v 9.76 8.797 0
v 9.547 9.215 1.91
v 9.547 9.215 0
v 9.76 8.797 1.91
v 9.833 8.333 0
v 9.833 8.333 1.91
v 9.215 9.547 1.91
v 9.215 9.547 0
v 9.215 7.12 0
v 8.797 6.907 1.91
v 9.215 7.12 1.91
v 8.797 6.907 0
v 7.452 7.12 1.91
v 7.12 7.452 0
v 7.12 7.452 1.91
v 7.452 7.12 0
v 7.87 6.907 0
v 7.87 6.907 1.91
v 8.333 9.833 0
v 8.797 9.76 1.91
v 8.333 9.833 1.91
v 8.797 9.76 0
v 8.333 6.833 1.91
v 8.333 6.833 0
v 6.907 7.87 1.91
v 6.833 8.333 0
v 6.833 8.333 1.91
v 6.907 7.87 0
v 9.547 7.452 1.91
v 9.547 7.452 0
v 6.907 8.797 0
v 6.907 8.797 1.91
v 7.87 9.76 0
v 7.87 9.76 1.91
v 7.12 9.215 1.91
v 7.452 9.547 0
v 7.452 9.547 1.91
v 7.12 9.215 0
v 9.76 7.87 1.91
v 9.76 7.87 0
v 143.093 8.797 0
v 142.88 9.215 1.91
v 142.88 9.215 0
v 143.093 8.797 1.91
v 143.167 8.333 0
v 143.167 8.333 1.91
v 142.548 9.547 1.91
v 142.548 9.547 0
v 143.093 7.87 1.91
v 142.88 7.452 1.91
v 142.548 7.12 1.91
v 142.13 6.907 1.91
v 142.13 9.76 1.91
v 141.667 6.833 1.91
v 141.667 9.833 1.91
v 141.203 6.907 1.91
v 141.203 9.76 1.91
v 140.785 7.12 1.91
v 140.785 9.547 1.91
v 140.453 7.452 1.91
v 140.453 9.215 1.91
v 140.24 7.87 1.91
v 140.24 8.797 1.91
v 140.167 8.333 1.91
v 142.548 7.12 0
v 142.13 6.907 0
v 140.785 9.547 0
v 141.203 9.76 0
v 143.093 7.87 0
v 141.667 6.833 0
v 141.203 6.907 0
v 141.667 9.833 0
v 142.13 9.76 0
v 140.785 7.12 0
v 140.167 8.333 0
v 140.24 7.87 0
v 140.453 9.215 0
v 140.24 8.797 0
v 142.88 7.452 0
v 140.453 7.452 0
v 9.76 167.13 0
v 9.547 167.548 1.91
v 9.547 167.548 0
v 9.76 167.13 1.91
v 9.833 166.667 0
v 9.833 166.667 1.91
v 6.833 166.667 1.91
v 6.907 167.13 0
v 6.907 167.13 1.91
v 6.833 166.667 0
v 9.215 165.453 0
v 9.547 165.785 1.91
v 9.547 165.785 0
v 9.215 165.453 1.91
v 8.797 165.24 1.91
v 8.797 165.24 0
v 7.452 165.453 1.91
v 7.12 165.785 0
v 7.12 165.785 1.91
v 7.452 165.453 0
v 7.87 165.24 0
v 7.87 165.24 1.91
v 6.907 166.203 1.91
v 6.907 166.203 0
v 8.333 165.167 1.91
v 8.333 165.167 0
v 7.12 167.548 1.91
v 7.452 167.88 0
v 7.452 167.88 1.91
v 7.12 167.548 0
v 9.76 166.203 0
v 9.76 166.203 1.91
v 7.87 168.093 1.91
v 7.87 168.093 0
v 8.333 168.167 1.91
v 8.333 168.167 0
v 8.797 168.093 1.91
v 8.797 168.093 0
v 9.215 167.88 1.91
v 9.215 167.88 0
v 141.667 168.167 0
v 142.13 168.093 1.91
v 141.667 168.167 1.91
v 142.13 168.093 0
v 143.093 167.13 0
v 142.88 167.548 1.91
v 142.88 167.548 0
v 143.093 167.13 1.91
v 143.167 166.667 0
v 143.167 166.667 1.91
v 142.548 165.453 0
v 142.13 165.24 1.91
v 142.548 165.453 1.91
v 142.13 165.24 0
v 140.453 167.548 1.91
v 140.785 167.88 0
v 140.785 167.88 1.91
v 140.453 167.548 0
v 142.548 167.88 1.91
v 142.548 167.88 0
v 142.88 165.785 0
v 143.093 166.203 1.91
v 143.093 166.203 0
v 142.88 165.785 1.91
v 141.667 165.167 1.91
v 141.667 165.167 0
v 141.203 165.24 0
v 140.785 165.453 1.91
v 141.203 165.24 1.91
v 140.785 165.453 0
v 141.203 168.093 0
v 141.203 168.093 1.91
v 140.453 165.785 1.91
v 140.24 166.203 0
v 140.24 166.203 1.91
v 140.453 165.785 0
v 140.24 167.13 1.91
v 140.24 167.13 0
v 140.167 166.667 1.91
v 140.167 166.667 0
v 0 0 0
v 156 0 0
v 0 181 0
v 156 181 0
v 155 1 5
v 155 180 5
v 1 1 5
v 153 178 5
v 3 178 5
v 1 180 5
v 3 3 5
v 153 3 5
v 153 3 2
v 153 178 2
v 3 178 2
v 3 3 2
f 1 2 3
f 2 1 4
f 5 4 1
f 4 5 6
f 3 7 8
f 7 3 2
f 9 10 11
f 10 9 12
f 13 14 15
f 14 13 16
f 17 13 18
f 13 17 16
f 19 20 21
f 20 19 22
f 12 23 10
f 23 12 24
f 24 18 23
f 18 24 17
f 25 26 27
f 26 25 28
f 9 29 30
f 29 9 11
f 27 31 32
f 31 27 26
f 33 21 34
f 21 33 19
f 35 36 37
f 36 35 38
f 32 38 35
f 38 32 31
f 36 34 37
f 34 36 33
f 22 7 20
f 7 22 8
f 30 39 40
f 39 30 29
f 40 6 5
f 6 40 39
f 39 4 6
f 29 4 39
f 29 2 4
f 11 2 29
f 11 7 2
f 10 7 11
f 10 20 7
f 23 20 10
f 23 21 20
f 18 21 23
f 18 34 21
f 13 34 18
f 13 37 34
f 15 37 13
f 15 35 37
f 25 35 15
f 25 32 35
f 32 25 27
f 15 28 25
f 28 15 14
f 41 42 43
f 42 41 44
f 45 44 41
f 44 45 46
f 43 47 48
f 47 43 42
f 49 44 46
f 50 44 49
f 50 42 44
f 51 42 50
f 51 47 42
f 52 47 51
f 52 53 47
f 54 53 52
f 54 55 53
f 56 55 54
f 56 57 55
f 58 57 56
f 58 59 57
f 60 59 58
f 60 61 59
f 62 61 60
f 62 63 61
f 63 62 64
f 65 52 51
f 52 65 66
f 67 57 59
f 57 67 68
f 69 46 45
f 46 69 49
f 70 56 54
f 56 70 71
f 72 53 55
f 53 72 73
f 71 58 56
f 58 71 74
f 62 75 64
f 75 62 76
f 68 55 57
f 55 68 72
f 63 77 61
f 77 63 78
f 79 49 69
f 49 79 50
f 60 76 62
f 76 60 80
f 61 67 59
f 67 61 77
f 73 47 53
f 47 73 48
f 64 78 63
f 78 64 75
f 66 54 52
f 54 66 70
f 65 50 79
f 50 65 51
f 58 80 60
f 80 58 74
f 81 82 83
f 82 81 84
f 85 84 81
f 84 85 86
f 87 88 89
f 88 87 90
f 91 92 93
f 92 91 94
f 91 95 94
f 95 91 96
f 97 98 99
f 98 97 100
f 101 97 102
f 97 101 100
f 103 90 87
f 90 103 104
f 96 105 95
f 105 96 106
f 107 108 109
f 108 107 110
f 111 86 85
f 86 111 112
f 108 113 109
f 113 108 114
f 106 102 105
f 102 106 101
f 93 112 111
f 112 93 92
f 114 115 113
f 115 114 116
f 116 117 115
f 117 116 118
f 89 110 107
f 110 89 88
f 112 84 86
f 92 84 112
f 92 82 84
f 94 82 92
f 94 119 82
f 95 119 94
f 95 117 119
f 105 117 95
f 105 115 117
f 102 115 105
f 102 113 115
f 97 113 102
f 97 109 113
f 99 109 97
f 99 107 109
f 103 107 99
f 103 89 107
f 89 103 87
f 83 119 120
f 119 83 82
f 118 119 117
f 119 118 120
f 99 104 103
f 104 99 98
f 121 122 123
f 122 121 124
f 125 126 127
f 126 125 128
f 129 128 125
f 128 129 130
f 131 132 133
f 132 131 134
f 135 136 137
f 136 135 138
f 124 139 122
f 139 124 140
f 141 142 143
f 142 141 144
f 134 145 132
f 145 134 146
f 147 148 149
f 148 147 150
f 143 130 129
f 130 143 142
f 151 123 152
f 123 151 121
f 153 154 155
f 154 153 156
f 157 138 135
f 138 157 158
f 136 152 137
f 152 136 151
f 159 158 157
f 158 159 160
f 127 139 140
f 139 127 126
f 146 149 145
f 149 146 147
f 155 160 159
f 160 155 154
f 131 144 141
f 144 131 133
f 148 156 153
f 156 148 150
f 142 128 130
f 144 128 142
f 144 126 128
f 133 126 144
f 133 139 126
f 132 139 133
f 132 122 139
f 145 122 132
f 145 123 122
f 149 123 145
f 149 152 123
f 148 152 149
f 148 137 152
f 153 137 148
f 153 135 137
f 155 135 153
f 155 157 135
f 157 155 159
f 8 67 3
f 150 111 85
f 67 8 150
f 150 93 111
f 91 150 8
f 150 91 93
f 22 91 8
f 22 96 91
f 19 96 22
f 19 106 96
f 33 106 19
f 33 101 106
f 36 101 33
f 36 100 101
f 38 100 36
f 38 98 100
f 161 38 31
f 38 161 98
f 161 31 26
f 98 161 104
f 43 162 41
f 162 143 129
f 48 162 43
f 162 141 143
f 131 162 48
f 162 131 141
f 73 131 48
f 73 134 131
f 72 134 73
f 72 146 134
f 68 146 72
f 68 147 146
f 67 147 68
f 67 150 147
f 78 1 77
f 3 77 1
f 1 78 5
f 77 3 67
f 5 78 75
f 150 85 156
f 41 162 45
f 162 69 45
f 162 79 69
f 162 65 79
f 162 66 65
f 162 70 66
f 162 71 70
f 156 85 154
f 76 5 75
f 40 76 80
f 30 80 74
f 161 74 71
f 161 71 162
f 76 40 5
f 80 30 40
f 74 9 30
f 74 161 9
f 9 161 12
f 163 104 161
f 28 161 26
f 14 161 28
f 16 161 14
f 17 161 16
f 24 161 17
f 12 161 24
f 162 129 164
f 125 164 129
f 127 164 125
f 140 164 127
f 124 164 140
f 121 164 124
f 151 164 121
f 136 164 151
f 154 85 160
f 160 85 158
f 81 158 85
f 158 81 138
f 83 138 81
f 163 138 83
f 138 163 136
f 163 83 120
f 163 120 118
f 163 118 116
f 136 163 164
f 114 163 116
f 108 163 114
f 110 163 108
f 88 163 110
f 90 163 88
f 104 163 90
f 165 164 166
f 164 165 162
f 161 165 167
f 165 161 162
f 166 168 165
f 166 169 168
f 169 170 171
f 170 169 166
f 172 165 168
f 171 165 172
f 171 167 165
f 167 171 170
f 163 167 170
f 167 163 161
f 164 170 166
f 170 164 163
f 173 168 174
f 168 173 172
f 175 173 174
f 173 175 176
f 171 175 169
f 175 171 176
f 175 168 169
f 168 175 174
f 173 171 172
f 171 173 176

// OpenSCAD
// Copyright 2023 Stefano Linguerri
//
// Licensed under the Apache License, Version 2.0 (the "License");
// you may not use this file except in compliance with the License.
// You may obtain a copy of the License at
// http://www.apache.org/licenses/LICENSE-2.0
//
// Unless required by applicable law or agreed to in writing, software
// distributed under the License is distributed on an "AS IS" BASIS,
// WITHOUT WARRANTIES OR CONDITIONS OF ANY KIND, either express or implied.¢
// See the License for the specific language governing permissions and
// limitations under the License.

//Number of columns for this tray
cols = 6;
//Number of rows for this tray
rows = 7;
//heigh (thickness) of this tray
height = 5;//.1
//new base width 
new_base_width = 25;
//new base length 
new_base_length = 25;
// existing base width of adapted models
adapted_base_width = 21;//.1
// existing base length of adapted models
adapted_base_length = 21;//.1
//minimum bottom height (thickness) of the insets for the bases
height_offset = 2;
// Outer border around the tray (mm).
// Note: wall thickness on each side = outer_border / 2
wall_thickness = 3;   // mm per side
//Inset of the top of the tray: greater the value greater the slope of the tray
inset = 1;
//if base adapted are round (in this case adapted_base_width is considered as the diameter of the round base)
isRound_adapted = false;
//magnets height (if greater than 1 will generate the insets)
magnets_height = 0.0;//.1
//magnets radius
magnets_radius = 0.0;//.1
//if the tray is for lance formation, use only the number of rows to genrate the tray
is_lance_formation = false;
//Put a mark to show the new base widh/length on the adapter
markBases = false;
//Creates a standard (not an adpater) movement tray for given Type for given new_base_length x new_base_width 
create_Movement_Tray_Type="4"; // [0:None, 4:Four walls, 3:Three walls]
//Creates holes under the tray for magnets
lower_Movement_tray_magnets="4"; // [0:None, 4:Four, 5:Five, 6:Six, 7:Seven, 9:Nine]
//Tray magnets height
lower_Movement_tray_magnets_height = 2.0;//.1
//Tray magnets radius
lower_Movement_tray_magnets_radius = 3.0;//.1

// DO NOT EDIT BELOW
// -----------------

outer_border = wall_thickness * 2;

module tray(cols, rows, height, new_base_width, new_base_length, adapted_base_width, adapted_base_length, inset, margin_for_empty_tray) {
    
        b_total_cols = (new_base_width * cols) + margin_for_empty_tray;
        b_total_rows = (new_base_length * rows)+ margin_for_empty_tray;
        
        t_total_cols = (new_base_width * cols - inset *2) + margin_for_empty_tray;
        t_total_rows = (new_base_length * rows - inset *2) + margin_for_empty_tray;
        
         polyhedron(
            points=[
                    [0,0,0],                        //base bottom left
                    [b_total_cols,0,0],             //base bottom right
                    [b_total_cols,b_total_rows,0],  //base top right
                    [0,b_total_rows,0],             //base top left
        

                    [inset,  inset,   height],                              //surface bottom left
                    [inset + t_total_cols, inset,  height],                 //surface bottom right
                    [inset + t_total_cols, inset + t_total_rows, height],   //surface top right
                    [inset,   inset + t_total_rows,  height]                //surface top left
                ],
            faces =[
                        [0,1,2,3],
                        [4,5,1,0],
                        [5,6,2,1],
                        [6,7,3,2],
                        [7,4,0,3],
                        [7,6,5,4]
                    ]
        ); 
   
}

//this module will create the hole in the "empty" classic movement tray
module empty_tray_hole(cols, rows, height_offset, new_base_width,  new_base_length, adapted_base_width, adapted_base_length, inset, margin_for_empty_tray,create_Movement_Tray_Type) {
    
    t_total_cols = (new_base_width * cols ) ;
    t_total_rows = (new_base_length * rows);

 
    translate( 
                [margin_for_empty_tray/2, //row
               margin_for_empty_tray/2, //col
                height_offset]
    )                       

    if(create_Movement_Tray_Type == "3"){
        cube([t_total_cols,t_total_rows+margin_for_empty_tray, 30]);            
    }else{
        cube([t_total_cols,t_total_rows, 30]);            
    }    
}

module adapted_base_holes(cols, rows, height_offset, new_base_width,  new_base_length, adapted_base_width, adapted_base_length) {
    
    gap_w = new_base_width - adapted_base_width;
    gap_l = new_base_length - adapted_base_length;

    for (c = [0:cols-1]){
        for (r = [0:rows-1]){
           translate( 
                        [gap_w/2 + (c*adapted_base_width) + (c*gap_w), //row
                        gap_l/2 + (r*adapted_base_length) + (r*gap_l), //col
                        height_offset]
            )                       
            cube([adapted_base_width,adapted_base_length, 30]);
            
        }
    }
}

module adapted_base_holes_round(cols, rows, height_offset, new_base_width, new_base_length, adapted_base_width, adapted_base_length) {
    
    for (c = [0:cols-1]){
        for (r = [0:rows-1]){
            translate( 
                        [new_base_width/2 + new_base_width * c , //row
                        new_base_length/2 + new_base_length * r, //col
                        height_offset]
            )
            //resize([adapted_base_width,adapted_base_length]) 
            cylinder(r = adapted_base_width/2, h = height);
           
        }
    }
}

module magnets_holes (cols, rows,  new_base_width, new_base_length, magnets_height, magnets_radius, height, height_offset) {
    
    for (c = [0:cols-1]){
        for (r = [0:rows-1]){
            translate( 
                        [new_base_width/2 + new_base_width * c , //row
                        new_base_length/2 + new_base_length * r, //col
                        height_offset-magnets_height+0.01]
            )
            cylinder(r = magnets_radius/2, h = magnets_height+0.01,$fn=20);
           
        }
    }
}

/// BASE MARKER
module mark_new_bases (cols, rows,  new_base_width, new_base_length, magnets_height, magnets_radius, height, height_offset) {
    color ([0.9, 0.4, 0.4])
                    {
        for (c = [1:cols-1]){
            translate( 
                [new_base_width * c-inset/2 , //col
                 new_base_length * 0, //row
                 height+height/5]
            )

            rotate([-90,0,0]) {             
                linear_extrude(new_base_length*rows) {
                     polygon(points=[[0,0],[1,0],[inset/2,(height-height_offset)]], paths=[[0,1,2]]);
                }
            }           
        }
        
        
        for (r = [1:rows-1]){
            translate( 
                    [new_base_width * 0 , //col
                     new_base_length * r-inset/2, //row
                     height+height/5]
            )
            rotate([90,90,90]) { 
                linear_extrude(new_base_width*cols) {
                    polygon(points=[[0,1],[(height-height_offset),inset/2],[0,0]], paths=[[0,1,2]]);
                }
            }
        }
    }
}

module lance_formation (cols, rows,  new_base_width, new_base_length, magnets_height, magnets_radius, height, height_offset,  inset, margin_for_empty_tray) {
    
    
    for (thisRow = [0:rows-1]){    

        translate( [0,thisRow*new_base_length,0]){
            for (thisCol = [0:thisRow]){    
                translate( [(new_base_width/2)*thisRow-(new_base_width*thisCol),0,0]){
                    //color([0.4, rands(0.01, 1,1)[0],rands(0.01, 1,1)[0] ])
                    color ([0.5, 0.5, 0.5])
                    {
                        lance_sloped_slot(thisCol+1, thisRow+1 == rows, height, new_base_width, new_base_length, adapted_base_width, adapted_base_length, inset, margin_for_empty_tray);
                    }    
                }
            }
        }
    }     
}

////////////////////////////////
// LANCE FORMATION            //
////////////////////////////////
module lance_sloped_slot(cols, isLastRow, height, new_base_width, new_base_length, adapted_base_width, adapted_base_length, inset, margin_for_empty_tray) {
    
        rows = 1;
    
        b_total_cols = (new_base_width * cols) + margin_for_empty_tray;
        b_total_rows = (new_base_length * rows)+ margin_for_empty_tray;
        
        t_total_cols = (new_base_width * cols - inset *2) + margin_for_empty_tray;
        t_total_rows = (new_base_length * rows - inset *2) + margin_for_empty_tray;

    

        polyhedron(
            points=[
                    [0,0,0],                        //base bottom left
                    [b_total_cols,0,0],             //base bottom right
                    [b_total_cols,b_total_rows,0],  //base top right
                    [0,b_total_rows,0],             //base top left
        
                    [inset,  inset,   height],                              //surface bottom left
                    [inset + t_total_cols, inset,  height],                 //surface bottom right
                    [inset + t_total_cols,  
                        isLastRow ? inset + t_total_rows : inset*3 + t_total_rows, //if last row we set the slope otherwise we move the y of the point to reach the next row
                        height],   //surface top right
                    [inset, 
                        isLastRow ? inset + t_total_rows : inset*3 + t_total_rows,//if last row we set the slope otherwise we move the y of the point to reach the next row
                        height]//surface top left
                ],
            faces =[
                        [0,1,2,3],
                        [4,5,1,0],
                        [5,6,2,1],
                        [6,7,3,2],
                        [7,4,0,3],
                        [7,6,5,4]
                    ]
        ); 
   
}


module lance_formation_hole (cols, rows,  new_base_width, new_base_length, magnets_height, magnets_radius, height, height_offset) {
    
    gap_w = new_base_width - adapted_base_width;
    gap_l = new_base_length - adapted_base_length;
    
    for (thisRow = [0:rows-1]){    

        translate( [0,thisRow*new_base_length+gap_l/2,height_offset]){
            for (thisCol = [0:thisRow]){                    
                translate( [(new_base_width/2)*thisRow-(new_base_width*thisCol)+gap_w/2,0,0]){
                    color([0.7, 0.7,0.7 ]){
                        cube([adapted_base_width, adapted_base_length,height+2 ]);
                    }    
                }
            }
        }
    }     
}

//Standard movement tray
module lance_formation_tray_hole (cols, rows,  new_base_width, new_base_length, magnets_height, magnets_radius, height, height_offset, inset, margin_for_empty_tray, create_Movement_Tray_Type) {
    
    gap_w = new_base_width - adapted_base_width;
    gap_l = new_base_length - adapted_base_length;
    
    for (thisRow = [0:rows-1]){    

        translate( [0,thisRow*new_base_length+margin_for_empty_tray/2,height_offset]){
            for (thisCol = [0:thisRow]){                    
                translate( [(new_base_width/2)*thisRow-(new_base_width*thisCol)+margin_for_empty_tray/2,0,0]){
                    color([0.7, 0.7,0.7 ]){
                    
                        if(create_Movement_Tray_Type == "3"){
                            cube([new_base_width, new_base_length+margin_for_empty_tray,height+2 ]);            
                        }else{
                            cube([new_base_width+0.05, new_base_length+0.05,height+2 ]);    
                        } 
                    }    
                }
            }
        }
    }     
}

module lance_formation_magnets_hole (cols, rows,  new_base_width, new_base_length, magnets_height, magnets_radius, height, height_offset) {
    
    gap_w = new_base_width - adapted_base_width;
    gap_l = new_base_length - adapted_base_length;
    
    for (thisRow = [0:rows-1]){    

        translate( [0,(thisRow+1)*new_base_length-new_base_length/2,height_offset-magnets_height+0.01]){
            for (thisCol = [0:thisRow]){                    
                translate( [(new_base_width/2)*thisRow-(new_base_width*thisCol)+gap_w/2+new_base_width/2,0,0]){
                    color([0.7, 0.7,0.7 ]){
                        cylinder(r = magnets_radius/2, h = magnets_height+0.01,$fn=20);
                    }    
                }
            }
        }
    }     
}

//Ranked movement tray
if(!is_lance_formation){
    difference(){        
            color ([0.5, 0.5, 0.5]) {
                if(create_Movement_Tray_Type == "0"){
                    tray(cols, rows, height, new_base_width, new_base_length, adapted_base_width, adapted_base_length, inset, 0);
                }else{
                    tray(cols, rows, height, new_base_width, new_base_length, adapted_base_width, adapted_base_length, inset, outer_border);
                }
            }
            color ([0.7, 0.7, 0.7]) {
                if (magnets_height > 0){
                    magnets_holes (cols, rows,  new_base_width, new_base_length, magnets_height, magnets_radius,height, height_offset);
                }
                if(create_Movement_Tray_Type == "0"){
                    if(!isRound_adapted){
                        adapted_base_holes(cols, rows, height_offset, new_base_width, new_base_length, adapted_base_width, adapted_base_length);
                    }else{
                        adapted_base_holes_round(cols, rows, height_offset, new_base_width, new_base_length, adapted_base_width, adapted_base_length);
                    }
                }else{//Add here the logic for the 4th back wall
                    empty_tray_hole(cols, rows, height_offset, new_base_width,  new_base_length, adapted_base_width, adapted_base_length, inset, outer_border,create_Movement_Tray_Type);
                }
            }
            
            if(markBases){
                echo("mark it");
                mark_new_bases (cols, rows,  new_base_width, new_base_length, magnets_height, magnets_radius, height, height_offset);
            }
            
            
            if(lower_Movement_tray_magnets != "0"){
                tray_magnets_holes(cols,rows,new_base_width,new_base_length, lower_Movement_tray_magnets_height, lower_Movement_tray_magnets_radius ,toInt(lower_Movement_tray_magnets),false);
            }

            
        
    }
}

//Lance formation movment tray
if(is_lance_formation){    
    difference(){      
        if(create_Movement_Tray_Type == "0"){
            union() {
                lance_formation (cols, rows,  new_base_width, new_base_length, magnets_height, magnets_radius, height, height_offset, inset, 0);
            }
        }else{
            union() {
                lance_formation (cols, rows,  new_base_width, new_base_length, magnets_height, magnets_radius, height, height_offset, inset, outer_border);
            }
        }
        
        if(create_Movement_Tray_Type == "0"){
            lance_formation_hole (cols, rows,  new_base_width, new_base_length, magnets_height, magnets_radius, height, height_offset);    
        }else{
            lance_formation_tray_hole(cols, rows,  new_base_width, new_base_length, magnets_height, magnets_radius, height, height_offset, inset, outer_border, create_Movement_Tray_Type);
        }
        
        if (magnets_height > 0){
            echo ("magnets lance");
            lance_formation_magnets_hole (cols, rows,  new_base_width, new_base_length, magnets_height, magnets_radius,height, height_offset);
        }
        /*
         if(lower_Movement_tray_magnets != "0"){
                tray_magnets_holes(cols,rows,new_base_width,new_base_length, lower_Movement_tray_magnets_height, lower_Movement_tray_magnets_radius ,toInt(lower_Movement_tray_magnets),true);
            }
*/
    }
}

//Movement tray lower magnets
module tray_magnets_holes (cols, rows,  new_base_width, new_base_length, magnets_height, magnets_radius, numbers, isLanceFormation) {


    if(isLanceFormation){
        echo("LAAAAANCEEE", cavalryShift(isLanceFormation, rows,new_base_width ));

    }
    //Bottom left
    translate( 
        [new_base_width/3 + new_base_width * 0 , 
        new_base_length/3 + new_base_length * 0, 
       -0.1]
    )
    cylinder(r = magnets_radius/2, h = magnets_height+0.01,$fn=20);

    //Bottom right
    translate( 
        [(new_base_width/3*2) + new_base_width * (cols-1) ,  
        new_base_length/3 + new_base_length * 0, 
       -0.1]
    )    
    cylinder(r = magnets_radius/2, h = magnets_height+0.01,$fn=20);

    //Top left
    translate( 
        [new_base_width/3 + new_base_width * 0 ,  
        (new_base_length/3*2)+ new_base_length * (rows-1),  
       -0.1]
    )
    cylinder(r = magnets_radius/2, h = magnets_height+0.01,$fn=20);
    
    //Top right
    translate( 
        [(new_base_width/3*2) + new_base_width * (cols-1)  ,  
        (new_base_length/3*2)+ new_base_length * (rows-1),  
       -0.1]
    )
    cylinder(r = magnets_radius/2, h = magnets_height+0.01,$fn=20);
    
    //middle/center
    if(numbers == 5 || numbers == 7 || numbers == 9 ){        
        translate( 
            [ new_base_width * (cols/2)  , //row
            new_base_length * (rows/2), //col
           -0.1]
        ) 
        cylinder(r = magnets_radius/2, h = magnets_height+0.01,$fn=20);
    }
    
    //middle left/right
    if(numbers == 7 || numbers == 6 || numbers == 9){        
        translate( 
            [new_base_width/3 + new_base_width * 0 , 
            new_base_length * (rows/2), 
            -0.1]
        )
        cylinder(r = magnets_radius/2, h = magnets_height+0.01,$fn=20);
        
        translate( 
            [(new_base_width/3*2) + new_base_width * (cols-1) ,  
            new_base_length * (rows/2), 
            -0.1]
        )   

        cylinder(r = magnets_radius/2, h = magnets_height+0.01,$fn=20);
    }
    
    //middle top/bottom
    if(numbers == 9){        
        translate( 
            [ new_base_width * (cols/2)  ,  
            new_base_length/3 + new_base_length * 0,  
           -0.1]
        ) 
        cylinder(r = magnets_radius/2, h = magnets_height+0.01,$fn=20);      
      
        translate( 
            [ new_base_width * (cols/2)  , 
            (new_base_length/3*2)+ new_base_length * (rows-1), 
           -0.1]
        ) 
        cylinder(r = magnets_radius/2, h = magnets_height+0.01,$fn=20);  
    }
    
}

function cavalryShift(isLanceFormation, cols, base_width) =
    isLanceFormation
    ? cols* base_width
    : 0;

function toInt(s, ret=0, i=0) =
    i >= len(s)
    ? ret
    : toInt(s, ret*10 + ord(s[i]) - ord("0"), i+1);
